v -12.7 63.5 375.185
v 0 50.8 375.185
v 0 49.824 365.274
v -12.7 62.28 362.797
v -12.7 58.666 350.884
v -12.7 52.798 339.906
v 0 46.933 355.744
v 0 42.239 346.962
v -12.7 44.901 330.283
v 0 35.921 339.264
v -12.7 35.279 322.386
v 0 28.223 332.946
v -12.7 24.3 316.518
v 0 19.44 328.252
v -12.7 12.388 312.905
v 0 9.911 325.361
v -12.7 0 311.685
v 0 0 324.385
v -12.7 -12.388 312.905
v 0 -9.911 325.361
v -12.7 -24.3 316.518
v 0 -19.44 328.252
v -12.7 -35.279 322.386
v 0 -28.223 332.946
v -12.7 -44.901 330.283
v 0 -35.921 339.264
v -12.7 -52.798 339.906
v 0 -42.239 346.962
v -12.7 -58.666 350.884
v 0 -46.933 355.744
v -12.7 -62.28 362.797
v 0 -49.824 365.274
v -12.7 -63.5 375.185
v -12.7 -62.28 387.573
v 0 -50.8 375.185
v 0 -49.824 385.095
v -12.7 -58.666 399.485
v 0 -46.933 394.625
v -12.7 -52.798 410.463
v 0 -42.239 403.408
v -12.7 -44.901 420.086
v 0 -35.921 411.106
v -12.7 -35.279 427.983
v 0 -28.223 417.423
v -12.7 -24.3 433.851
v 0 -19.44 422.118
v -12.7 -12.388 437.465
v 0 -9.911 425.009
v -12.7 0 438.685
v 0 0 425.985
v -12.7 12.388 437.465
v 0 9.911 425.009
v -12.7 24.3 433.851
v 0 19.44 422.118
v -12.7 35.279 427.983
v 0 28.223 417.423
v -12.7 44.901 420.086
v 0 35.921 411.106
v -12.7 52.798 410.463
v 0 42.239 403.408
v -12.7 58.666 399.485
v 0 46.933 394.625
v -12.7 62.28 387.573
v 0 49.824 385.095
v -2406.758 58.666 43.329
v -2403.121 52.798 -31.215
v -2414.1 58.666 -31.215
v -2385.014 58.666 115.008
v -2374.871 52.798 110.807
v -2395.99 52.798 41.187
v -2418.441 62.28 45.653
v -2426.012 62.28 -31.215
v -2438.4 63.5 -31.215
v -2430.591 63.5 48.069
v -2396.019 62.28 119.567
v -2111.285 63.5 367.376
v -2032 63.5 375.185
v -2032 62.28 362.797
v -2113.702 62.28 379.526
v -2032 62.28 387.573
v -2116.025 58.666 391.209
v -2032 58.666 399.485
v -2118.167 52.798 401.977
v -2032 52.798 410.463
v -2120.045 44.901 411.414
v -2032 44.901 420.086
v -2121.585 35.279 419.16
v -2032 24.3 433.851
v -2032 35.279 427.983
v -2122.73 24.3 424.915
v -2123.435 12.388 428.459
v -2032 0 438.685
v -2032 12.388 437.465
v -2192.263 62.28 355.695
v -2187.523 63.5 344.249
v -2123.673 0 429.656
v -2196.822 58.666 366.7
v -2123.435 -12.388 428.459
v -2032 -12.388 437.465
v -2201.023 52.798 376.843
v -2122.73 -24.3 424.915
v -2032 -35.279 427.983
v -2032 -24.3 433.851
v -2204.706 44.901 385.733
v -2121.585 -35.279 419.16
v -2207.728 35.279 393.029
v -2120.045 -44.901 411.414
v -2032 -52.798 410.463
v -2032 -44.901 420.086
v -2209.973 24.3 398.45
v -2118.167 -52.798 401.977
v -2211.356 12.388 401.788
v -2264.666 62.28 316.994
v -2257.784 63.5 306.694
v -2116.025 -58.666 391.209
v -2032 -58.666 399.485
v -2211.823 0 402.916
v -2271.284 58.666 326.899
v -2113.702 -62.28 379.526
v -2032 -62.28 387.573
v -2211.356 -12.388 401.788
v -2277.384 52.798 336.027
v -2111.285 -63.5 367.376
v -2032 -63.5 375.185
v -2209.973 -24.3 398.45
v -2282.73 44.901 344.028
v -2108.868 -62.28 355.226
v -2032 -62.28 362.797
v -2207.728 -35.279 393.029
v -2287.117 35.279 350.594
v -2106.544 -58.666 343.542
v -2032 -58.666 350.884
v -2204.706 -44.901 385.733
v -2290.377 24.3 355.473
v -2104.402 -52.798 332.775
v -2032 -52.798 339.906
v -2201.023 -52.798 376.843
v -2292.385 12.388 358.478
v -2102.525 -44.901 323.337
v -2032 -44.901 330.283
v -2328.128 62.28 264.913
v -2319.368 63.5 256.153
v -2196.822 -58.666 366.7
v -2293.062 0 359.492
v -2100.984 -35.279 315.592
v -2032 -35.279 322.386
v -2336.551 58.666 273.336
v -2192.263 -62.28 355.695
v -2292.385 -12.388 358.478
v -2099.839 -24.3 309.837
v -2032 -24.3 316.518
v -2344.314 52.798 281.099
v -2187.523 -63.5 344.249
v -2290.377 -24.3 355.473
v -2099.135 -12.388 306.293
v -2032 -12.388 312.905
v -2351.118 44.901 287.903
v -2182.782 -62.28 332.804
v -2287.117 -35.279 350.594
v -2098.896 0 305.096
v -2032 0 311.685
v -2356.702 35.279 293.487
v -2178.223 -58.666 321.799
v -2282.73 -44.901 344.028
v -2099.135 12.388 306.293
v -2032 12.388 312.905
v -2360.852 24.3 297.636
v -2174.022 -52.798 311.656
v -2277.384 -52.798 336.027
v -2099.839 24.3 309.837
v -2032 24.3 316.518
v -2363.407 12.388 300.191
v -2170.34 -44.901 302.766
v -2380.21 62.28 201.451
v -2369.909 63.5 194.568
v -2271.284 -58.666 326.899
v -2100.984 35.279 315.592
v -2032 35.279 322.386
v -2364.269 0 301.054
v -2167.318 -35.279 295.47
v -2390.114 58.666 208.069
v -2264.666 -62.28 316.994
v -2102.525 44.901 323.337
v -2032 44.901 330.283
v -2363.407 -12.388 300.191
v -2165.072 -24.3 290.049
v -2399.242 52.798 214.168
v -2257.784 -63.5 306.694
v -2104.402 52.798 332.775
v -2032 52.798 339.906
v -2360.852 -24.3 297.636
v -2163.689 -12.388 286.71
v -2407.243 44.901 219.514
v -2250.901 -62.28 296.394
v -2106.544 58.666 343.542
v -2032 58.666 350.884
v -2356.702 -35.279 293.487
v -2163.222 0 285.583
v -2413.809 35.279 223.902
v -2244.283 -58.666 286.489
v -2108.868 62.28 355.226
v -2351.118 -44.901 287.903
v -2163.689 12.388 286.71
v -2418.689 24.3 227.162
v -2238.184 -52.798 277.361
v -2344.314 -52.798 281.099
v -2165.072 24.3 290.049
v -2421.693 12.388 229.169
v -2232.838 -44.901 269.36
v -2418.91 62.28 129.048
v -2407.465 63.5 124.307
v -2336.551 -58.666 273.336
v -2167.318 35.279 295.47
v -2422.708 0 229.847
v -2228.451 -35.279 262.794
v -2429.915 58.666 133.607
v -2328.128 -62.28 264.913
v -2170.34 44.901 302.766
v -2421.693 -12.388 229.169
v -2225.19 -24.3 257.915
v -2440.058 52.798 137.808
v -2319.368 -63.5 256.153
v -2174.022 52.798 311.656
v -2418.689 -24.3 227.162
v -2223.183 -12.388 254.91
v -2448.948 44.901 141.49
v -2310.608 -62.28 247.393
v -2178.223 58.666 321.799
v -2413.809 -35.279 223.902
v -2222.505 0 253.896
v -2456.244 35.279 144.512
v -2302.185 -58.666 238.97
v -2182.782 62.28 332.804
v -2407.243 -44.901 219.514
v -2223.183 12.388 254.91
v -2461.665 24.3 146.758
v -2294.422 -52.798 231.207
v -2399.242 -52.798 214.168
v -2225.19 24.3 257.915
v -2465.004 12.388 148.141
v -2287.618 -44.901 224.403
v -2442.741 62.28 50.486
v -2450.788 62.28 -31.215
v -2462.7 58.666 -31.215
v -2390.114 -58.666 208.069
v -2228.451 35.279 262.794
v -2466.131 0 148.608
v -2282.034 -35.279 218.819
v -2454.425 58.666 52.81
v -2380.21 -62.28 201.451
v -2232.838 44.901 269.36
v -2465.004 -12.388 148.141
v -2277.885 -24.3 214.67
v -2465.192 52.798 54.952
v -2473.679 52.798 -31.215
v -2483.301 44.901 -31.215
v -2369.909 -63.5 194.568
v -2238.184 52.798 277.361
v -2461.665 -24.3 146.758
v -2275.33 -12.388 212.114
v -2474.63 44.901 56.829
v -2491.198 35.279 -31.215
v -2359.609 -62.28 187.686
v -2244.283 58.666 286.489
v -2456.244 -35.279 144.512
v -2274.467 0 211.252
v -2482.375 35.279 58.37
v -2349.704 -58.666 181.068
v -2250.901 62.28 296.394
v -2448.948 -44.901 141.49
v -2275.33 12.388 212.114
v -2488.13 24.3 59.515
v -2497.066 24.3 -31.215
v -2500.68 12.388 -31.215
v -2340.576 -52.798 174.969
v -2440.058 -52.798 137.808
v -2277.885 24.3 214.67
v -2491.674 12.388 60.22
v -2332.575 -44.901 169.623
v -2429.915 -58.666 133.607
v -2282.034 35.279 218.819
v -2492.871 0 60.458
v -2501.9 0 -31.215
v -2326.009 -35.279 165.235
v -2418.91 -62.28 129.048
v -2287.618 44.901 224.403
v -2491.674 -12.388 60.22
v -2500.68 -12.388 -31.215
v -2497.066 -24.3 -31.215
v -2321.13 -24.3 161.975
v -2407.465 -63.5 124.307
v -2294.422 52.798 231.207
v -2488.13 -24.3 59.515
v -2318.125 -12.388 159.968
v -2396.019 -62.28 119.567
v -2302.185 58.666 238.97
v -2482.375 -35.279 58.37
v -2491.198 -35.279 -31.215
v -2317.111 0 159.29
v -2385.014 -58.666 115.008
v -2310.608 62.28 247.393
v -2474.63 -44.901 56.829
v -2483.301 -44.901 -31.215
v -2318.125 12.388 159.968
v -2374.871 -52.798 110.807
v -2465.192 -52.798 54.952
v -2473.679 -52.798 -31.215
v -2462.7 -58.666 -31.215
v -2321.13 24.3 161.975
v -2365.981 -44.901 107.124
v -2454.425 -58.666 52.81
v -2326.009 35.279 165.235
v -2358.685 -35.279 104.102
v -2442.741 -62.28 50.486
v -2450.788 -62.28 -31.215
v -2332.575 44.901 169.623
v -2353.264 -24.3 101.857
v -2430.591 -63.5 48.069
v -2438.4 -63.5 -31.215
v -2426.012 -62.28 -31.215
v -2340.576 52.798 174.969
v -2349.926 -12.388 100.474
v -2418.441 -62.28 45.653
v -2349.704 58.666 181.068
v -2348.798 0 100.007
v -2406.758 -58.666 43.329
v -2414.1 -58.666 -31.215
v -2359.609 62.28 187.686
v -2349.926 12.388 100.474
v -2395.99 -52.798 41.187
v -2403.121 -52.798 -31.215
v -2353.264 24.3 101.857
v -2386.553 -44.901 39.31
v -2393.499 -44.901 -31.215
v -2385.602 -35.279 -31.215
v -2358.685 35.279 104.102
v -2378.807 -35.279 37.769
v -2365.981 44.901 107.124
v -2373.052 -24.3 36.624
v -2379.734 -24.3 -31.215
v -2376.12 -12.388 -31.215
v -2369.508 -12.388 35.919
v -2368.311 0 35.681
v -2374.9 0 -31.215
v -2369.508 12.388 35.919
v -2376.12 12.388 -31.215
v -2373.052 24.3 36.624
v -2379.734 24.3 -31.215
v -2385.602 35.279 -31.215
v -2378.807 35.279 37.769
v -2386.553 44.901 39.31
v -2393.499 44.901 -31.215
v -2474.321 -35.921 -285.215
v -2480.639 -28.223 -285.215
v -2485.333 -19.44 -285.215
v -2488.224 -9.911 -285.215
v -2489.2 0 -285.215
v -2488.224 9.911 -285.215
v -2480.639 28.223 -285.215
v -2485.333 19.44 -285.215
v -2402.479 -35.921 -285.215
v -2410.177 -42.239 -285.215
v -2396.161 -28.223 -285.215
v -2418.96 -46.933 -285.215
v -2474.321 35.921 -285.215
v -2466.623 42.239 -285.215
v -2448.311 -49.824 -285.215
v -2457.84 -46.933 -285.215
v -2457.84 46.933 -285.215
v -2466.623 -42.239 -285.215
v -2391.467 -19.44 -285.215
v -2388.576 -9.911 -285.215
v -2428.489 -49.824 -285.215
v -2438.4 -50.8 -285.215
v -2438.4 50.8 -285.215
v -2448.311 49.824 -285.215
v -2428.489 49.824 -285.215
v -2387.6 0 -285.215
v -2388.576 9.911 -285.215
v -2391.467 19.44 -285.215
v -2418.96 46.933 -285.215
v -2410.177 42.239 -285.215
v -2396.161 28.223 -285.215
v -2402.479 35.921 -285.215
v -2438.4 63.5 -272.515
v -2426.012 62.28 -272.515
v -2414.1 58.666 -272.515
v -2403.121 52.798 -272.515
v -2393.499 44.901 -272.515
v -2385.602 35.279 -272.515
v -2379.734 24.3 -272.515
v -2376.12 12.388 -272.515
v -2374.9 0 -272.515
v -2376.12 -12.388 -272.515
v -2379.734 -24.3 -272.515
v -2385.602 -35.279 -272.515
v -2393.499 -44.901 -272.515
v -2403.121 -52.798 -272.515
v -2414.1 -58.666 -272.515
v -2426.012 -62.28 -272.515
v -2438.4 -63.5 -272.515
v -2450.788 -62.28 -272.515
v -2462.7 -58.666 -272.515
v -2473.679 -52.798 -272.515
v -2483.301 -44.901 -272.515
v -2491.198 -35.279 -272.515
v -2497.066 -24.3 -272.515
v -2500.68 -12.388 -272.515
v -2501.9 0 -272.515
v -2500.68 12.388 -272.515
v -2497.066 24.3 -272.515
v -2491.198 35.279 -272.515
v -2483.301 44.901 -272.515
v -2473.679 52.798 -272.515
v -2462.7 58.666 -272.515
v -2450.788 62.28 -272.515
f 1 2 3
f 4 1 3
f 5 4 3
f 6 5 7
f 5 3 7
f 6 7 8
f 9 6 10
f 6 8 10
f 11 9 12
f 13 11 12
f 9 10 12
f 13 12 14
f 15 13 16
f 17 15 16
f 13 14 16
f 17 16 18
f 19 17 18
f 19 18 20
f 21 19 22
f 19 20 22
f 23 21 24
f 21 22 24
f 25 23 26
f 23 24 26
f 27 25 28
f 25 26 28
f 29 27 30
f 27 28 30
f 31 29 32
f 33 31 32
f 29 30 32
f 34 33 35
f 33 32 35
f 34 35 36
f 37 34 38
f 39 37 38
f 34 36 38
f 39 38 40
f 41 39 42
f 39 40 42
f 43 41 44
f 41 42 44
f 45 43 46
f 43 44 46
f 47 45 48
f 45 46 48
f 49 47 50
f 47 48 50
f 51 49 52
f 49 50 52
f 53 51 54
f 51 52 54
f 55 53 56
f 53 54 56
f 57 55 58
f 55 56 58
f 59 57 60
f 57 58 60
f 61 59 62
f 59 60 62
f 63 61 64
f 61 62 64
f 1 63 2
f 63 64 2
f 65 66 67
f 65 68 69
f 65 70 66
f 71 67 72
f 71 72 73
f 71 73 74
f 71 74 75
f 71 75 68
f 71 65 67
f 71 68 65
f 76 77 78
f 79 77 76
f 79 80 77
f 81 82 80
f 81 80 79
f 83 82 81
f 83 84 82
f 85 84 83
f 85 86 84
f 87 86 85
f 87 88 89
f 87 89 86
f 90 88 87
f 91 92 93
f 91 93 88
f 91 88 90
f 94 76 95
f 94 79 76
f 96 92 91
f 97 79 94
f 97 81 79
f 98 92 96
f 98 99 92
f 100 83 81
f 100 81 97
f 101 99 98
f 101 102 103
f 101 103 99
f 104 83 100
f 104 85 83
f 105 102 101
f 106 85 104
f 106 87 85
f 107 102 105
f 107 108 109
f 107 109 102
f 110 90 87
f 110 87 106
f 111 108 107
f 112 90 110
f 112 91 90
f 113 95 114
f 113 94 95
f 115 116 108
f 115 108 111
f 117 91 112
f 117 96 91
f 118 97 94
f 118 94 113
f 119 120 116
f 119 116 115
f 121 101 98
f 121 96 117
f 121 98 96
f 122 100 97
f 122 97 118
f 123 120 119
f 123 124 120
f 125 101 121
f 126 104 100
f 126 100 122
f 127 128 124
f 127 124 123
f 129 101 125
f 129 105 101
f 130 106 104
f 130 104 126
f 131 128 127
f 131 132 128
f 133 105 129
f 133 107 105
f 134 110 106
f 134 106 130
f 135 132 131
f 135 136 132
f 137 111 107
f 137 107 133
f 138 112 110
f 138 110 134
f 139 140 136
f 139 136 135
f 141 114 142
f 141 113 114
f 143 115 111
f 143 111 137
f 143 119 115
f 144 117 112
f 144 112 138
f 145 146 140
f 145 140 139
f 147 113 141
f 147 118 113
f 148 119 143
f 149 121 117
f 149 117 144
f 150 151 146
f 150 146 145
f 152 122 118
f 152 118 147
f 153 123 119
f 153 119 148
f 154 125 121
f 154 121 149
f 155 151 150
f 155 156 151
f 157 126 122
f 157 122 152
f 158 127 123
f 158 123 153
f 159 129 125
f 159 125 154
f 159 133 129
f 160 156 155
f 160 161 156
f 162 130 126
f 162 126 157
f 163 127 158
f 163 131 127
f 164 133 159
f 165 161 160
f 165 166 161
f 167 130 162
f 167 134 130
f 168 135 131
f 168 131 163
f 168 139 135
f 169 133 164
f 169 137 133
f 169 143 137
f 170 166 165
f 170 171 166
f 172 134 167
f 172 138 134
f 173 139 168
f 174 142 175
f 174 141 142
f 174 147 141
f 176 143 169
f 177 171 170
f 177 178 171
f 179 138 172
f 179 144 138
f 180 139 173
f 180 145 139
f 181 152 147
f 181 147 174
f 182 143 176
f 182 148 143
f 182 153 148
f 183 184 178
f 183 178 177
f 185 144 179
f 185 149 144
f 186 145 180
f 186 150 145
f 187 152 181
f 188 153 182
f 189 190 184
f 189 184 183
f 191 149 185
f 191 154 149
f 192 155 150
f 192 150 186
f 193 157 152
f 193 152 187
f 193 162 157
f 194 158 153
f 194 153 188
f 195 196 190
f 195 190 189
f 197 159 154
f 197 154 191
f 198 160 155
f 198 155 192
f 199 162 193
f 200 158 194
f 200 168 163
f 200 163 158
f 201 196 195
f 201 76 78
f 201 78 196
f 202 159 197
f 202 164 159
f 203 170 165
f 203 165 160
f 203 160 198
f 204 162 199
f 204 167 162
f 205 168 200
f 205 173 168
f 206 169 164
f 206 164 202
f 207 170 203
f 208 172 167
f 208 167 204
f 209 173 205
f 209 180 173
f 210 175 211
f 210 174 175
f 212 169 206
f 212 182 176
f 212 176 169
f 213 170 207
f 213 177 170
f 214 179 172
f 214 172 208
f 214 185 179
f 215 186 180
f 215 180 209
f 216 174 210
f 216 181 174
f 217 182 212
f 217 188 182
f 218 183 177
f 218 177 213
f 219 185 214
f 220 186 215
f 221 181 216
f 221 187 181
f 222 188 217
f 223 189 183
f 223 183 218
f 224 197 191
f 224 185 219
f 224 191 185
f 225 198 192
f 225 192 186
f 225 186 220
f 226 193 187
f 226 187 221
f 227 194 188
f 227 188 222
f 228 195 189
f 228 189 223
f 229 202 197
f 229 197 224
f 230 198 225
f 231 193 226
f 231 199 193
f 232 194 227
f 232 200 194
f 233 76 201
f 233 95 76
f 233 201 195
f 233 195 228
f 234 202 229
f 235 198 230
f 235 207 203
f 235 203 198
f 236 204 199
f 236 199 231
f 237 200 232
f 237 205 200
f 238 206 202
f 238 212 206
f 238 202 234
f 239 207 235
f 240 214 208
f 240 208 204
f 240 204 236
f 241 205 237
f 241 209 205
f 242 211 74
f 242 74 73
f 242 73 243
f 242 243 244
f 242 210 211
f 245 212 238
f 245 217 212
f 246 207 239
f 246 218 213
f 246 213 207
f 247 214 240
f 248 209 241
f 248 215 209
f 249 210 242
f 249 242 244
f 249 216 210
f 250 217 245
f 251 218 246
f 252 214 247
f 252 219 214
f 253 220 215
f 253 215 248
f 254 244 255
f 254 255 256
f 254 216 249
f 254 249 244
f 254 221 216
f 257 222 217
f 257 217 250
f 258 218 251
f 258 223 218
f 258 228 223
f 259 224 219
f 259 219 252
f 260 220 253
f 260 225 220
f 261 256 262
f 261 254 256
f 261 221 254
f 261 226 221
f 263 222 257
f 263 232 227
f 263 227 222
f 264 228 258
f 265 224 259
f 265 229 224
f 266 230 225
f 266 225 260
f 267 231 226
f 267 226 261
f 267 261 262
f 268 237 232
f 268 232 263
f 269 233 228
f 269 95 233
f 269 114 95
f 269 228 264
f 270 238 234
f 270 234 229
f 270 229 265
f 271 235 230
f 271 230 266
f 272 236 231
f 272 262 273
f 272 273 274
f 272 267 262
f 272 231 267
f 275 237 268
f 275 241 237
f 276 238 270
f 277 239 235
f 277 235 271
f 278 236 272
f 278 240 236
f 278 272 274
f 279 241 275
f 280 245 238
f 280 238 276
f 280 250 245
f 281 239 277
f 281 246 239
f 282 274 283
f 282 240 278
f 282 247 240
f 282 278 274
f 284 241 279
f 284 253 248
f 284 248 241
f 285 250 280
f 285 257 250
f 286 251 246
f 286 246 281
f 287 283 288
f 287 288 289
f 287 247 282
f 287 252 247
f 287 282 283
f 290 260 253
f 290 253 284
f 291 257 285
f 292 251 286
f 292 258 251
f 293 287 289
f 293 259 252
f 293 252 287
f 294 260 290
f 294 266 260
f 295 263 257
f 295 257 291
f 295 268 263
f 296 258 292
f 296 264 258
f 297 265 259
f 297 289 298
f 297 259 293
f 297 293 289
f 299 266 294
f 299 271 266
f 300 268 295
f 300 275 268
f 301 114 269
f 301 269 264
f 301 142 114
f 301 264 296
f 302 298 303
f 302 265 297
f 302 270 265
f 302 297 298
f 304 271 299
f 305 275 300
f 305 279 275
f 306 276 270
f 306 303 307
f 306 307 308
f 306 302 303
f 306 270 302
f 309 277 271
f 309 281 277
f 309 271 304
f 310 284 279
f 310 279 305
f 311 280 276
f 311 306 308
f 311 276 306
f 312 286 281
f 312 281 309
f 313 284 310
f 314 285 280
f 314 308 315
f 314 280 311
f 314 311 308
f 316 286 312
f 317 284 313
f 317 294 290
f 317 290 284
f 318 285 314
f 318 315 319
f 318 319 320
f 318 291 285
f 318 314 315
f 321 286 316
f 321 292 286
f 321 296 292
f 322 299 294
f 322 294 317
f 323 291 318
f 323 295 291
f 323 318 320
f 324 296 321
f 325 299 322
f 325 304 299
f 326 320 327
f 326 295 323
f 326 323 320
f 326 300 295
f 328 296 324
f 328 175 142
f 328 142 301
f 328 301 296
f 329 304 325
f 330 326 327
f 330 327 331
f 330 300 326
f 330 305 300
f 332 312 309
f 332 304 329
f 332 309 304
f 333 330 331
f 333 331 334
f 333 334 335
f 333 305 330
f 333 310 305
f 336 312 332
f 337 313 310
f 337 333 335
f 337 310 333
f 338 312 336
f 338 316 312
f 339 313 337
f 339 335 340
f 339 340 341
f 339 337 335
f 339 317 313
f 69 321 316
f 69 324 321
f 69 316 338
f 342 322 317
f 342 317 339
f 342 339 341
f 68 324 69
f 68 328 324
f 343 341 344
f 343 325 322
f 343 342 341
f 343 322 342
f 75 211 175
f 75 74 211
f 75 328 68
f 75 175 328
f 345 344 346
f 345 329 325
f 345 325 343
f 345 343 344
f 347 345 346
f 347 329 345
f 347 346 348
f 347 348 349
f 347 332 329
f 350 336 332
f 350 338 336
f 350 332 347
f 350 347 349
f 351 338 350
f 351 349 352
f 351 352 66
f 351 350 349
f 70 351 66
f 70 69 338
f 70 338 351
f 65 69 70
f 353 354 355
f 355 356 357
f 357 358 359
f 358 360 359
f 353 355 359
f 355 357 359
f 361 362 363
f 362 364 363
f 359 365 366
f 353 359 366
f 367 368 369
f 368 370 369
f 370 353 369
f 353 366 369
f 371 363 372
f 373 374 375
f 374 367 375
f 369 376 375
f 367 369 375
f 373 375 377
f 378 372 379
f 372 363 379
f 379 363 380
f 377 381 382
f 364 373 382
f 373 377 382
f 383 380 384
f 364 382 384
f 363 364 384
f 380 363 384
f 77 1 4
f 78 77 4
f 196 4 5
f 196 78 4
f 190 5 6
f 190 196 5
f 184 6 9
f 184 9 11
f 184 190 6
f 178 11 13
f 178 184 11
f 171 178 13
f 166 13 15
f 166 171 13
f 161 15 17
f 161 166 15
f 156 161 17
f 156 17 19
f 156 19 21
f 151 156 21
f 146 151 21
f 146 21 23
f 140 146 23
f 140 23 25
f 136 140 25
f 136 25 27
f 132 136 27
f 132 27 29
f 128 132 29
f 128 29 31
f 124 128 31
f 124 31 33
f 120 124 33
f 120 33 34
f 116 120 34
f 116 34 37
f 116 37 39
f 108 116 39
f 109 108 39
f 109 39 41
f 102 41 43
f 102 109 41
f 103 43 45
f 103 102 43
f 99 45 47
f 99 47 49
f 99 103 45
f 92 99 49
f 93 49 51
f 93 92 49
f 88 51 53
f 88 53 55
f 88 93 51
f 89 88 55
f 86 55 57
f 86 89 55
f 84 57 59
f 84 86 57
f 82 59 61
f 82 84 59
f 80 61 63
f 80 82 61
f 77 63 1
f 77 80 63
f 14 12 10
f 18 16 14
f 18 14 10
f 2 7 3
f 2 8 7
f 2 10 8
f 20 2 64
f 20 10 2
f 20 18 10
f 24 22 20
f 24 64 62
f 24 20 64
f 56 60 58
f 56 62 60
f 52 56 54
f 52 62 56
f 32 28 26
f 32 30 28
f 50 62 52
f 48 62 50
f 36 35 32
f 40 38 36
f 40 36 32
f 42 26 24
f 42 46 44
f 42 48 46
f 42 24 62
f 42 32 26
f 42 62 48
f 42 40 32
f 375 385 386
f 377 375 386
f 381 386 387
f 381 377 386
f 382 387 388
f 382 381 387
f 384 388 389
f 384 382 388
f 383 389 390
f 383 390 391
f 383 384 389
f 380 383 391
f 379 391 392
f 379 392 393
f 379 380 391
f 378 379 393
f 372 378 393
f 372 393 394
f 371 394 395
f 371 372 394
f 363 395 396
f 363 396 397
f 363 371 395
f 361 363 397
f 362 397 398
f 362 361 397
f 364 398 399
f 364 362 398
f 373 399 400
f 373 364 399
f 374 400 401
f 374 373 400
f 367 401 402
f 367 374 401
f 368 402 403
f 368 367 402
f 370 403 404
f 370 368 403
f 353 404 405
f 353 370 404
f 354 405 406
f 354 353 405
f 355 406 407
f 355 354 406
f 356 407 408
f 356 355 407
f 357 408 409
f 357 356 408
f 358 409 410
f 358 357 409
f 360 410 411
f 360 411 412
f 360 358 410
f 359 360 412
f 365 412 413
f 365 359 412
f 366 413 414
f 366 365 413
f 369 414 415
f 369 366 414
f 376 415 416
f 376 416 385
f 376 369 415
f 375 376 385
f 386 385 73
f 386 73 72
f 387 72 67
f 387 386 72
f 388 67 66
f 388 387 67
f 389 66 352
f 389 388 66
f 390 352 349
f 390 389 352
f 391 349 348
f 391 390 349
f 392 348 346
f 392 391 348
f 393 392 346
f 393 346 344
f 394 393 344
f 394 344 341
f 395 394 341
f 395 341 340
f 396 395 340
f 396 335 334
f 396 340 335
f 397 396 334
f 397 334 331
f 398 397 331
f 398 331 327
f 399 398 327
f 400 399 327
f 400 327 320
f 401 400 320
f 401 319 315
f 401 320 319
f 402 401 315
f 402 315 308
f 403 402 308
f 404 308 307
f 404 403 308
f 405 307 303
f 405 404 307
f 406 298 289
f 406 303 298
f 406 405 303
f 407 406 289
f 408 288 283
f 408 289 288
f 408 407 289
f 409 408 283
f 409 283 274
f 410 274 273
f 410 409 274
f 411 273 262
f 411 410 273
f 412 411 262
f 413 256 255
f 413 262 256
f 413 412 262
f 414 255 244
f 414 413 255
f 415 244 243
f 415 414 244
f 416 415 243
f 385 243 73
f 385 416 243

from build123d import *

# Parameters (mm, degrees)
F1_R     = 63.5
F3_SIZE2 = 12.7
F3_SIZE  = 12.7


with BuildPart() as f2:
    # F2: sweep along a path in F0
    with BuildLine(Plane.XZ) as f2_path:
        Line((0, 375.1847569466), (-2032, 375.1847569466))
        ThreePointArc((-2032, 375.1847569466), (-2319.3681958742, 256.1529528208), (-2438.4, -31.2152430534))
        Line((-2438.4, -31.2152430534), (-2438.4, -285.2152430534))
    # F1 (on Right) → F2 (sweep)
    with BuildSketch(Plane.YZ):
        with Locations((0, 375.1847569466)):
            Circle(F1_R)
    sweep(path=f2_path.line)

    # F3
    f3_edges = [f2.edges().sort_by_distance(p)[0] for p in [
        (0, -63.5, 375.184757),
        (-2438.4, -63.5, -285.215243),
    ]]
    chamfer(f3_edges, length=F3_SIZE, length2=F3_SIZE2)


solid = f2.part
